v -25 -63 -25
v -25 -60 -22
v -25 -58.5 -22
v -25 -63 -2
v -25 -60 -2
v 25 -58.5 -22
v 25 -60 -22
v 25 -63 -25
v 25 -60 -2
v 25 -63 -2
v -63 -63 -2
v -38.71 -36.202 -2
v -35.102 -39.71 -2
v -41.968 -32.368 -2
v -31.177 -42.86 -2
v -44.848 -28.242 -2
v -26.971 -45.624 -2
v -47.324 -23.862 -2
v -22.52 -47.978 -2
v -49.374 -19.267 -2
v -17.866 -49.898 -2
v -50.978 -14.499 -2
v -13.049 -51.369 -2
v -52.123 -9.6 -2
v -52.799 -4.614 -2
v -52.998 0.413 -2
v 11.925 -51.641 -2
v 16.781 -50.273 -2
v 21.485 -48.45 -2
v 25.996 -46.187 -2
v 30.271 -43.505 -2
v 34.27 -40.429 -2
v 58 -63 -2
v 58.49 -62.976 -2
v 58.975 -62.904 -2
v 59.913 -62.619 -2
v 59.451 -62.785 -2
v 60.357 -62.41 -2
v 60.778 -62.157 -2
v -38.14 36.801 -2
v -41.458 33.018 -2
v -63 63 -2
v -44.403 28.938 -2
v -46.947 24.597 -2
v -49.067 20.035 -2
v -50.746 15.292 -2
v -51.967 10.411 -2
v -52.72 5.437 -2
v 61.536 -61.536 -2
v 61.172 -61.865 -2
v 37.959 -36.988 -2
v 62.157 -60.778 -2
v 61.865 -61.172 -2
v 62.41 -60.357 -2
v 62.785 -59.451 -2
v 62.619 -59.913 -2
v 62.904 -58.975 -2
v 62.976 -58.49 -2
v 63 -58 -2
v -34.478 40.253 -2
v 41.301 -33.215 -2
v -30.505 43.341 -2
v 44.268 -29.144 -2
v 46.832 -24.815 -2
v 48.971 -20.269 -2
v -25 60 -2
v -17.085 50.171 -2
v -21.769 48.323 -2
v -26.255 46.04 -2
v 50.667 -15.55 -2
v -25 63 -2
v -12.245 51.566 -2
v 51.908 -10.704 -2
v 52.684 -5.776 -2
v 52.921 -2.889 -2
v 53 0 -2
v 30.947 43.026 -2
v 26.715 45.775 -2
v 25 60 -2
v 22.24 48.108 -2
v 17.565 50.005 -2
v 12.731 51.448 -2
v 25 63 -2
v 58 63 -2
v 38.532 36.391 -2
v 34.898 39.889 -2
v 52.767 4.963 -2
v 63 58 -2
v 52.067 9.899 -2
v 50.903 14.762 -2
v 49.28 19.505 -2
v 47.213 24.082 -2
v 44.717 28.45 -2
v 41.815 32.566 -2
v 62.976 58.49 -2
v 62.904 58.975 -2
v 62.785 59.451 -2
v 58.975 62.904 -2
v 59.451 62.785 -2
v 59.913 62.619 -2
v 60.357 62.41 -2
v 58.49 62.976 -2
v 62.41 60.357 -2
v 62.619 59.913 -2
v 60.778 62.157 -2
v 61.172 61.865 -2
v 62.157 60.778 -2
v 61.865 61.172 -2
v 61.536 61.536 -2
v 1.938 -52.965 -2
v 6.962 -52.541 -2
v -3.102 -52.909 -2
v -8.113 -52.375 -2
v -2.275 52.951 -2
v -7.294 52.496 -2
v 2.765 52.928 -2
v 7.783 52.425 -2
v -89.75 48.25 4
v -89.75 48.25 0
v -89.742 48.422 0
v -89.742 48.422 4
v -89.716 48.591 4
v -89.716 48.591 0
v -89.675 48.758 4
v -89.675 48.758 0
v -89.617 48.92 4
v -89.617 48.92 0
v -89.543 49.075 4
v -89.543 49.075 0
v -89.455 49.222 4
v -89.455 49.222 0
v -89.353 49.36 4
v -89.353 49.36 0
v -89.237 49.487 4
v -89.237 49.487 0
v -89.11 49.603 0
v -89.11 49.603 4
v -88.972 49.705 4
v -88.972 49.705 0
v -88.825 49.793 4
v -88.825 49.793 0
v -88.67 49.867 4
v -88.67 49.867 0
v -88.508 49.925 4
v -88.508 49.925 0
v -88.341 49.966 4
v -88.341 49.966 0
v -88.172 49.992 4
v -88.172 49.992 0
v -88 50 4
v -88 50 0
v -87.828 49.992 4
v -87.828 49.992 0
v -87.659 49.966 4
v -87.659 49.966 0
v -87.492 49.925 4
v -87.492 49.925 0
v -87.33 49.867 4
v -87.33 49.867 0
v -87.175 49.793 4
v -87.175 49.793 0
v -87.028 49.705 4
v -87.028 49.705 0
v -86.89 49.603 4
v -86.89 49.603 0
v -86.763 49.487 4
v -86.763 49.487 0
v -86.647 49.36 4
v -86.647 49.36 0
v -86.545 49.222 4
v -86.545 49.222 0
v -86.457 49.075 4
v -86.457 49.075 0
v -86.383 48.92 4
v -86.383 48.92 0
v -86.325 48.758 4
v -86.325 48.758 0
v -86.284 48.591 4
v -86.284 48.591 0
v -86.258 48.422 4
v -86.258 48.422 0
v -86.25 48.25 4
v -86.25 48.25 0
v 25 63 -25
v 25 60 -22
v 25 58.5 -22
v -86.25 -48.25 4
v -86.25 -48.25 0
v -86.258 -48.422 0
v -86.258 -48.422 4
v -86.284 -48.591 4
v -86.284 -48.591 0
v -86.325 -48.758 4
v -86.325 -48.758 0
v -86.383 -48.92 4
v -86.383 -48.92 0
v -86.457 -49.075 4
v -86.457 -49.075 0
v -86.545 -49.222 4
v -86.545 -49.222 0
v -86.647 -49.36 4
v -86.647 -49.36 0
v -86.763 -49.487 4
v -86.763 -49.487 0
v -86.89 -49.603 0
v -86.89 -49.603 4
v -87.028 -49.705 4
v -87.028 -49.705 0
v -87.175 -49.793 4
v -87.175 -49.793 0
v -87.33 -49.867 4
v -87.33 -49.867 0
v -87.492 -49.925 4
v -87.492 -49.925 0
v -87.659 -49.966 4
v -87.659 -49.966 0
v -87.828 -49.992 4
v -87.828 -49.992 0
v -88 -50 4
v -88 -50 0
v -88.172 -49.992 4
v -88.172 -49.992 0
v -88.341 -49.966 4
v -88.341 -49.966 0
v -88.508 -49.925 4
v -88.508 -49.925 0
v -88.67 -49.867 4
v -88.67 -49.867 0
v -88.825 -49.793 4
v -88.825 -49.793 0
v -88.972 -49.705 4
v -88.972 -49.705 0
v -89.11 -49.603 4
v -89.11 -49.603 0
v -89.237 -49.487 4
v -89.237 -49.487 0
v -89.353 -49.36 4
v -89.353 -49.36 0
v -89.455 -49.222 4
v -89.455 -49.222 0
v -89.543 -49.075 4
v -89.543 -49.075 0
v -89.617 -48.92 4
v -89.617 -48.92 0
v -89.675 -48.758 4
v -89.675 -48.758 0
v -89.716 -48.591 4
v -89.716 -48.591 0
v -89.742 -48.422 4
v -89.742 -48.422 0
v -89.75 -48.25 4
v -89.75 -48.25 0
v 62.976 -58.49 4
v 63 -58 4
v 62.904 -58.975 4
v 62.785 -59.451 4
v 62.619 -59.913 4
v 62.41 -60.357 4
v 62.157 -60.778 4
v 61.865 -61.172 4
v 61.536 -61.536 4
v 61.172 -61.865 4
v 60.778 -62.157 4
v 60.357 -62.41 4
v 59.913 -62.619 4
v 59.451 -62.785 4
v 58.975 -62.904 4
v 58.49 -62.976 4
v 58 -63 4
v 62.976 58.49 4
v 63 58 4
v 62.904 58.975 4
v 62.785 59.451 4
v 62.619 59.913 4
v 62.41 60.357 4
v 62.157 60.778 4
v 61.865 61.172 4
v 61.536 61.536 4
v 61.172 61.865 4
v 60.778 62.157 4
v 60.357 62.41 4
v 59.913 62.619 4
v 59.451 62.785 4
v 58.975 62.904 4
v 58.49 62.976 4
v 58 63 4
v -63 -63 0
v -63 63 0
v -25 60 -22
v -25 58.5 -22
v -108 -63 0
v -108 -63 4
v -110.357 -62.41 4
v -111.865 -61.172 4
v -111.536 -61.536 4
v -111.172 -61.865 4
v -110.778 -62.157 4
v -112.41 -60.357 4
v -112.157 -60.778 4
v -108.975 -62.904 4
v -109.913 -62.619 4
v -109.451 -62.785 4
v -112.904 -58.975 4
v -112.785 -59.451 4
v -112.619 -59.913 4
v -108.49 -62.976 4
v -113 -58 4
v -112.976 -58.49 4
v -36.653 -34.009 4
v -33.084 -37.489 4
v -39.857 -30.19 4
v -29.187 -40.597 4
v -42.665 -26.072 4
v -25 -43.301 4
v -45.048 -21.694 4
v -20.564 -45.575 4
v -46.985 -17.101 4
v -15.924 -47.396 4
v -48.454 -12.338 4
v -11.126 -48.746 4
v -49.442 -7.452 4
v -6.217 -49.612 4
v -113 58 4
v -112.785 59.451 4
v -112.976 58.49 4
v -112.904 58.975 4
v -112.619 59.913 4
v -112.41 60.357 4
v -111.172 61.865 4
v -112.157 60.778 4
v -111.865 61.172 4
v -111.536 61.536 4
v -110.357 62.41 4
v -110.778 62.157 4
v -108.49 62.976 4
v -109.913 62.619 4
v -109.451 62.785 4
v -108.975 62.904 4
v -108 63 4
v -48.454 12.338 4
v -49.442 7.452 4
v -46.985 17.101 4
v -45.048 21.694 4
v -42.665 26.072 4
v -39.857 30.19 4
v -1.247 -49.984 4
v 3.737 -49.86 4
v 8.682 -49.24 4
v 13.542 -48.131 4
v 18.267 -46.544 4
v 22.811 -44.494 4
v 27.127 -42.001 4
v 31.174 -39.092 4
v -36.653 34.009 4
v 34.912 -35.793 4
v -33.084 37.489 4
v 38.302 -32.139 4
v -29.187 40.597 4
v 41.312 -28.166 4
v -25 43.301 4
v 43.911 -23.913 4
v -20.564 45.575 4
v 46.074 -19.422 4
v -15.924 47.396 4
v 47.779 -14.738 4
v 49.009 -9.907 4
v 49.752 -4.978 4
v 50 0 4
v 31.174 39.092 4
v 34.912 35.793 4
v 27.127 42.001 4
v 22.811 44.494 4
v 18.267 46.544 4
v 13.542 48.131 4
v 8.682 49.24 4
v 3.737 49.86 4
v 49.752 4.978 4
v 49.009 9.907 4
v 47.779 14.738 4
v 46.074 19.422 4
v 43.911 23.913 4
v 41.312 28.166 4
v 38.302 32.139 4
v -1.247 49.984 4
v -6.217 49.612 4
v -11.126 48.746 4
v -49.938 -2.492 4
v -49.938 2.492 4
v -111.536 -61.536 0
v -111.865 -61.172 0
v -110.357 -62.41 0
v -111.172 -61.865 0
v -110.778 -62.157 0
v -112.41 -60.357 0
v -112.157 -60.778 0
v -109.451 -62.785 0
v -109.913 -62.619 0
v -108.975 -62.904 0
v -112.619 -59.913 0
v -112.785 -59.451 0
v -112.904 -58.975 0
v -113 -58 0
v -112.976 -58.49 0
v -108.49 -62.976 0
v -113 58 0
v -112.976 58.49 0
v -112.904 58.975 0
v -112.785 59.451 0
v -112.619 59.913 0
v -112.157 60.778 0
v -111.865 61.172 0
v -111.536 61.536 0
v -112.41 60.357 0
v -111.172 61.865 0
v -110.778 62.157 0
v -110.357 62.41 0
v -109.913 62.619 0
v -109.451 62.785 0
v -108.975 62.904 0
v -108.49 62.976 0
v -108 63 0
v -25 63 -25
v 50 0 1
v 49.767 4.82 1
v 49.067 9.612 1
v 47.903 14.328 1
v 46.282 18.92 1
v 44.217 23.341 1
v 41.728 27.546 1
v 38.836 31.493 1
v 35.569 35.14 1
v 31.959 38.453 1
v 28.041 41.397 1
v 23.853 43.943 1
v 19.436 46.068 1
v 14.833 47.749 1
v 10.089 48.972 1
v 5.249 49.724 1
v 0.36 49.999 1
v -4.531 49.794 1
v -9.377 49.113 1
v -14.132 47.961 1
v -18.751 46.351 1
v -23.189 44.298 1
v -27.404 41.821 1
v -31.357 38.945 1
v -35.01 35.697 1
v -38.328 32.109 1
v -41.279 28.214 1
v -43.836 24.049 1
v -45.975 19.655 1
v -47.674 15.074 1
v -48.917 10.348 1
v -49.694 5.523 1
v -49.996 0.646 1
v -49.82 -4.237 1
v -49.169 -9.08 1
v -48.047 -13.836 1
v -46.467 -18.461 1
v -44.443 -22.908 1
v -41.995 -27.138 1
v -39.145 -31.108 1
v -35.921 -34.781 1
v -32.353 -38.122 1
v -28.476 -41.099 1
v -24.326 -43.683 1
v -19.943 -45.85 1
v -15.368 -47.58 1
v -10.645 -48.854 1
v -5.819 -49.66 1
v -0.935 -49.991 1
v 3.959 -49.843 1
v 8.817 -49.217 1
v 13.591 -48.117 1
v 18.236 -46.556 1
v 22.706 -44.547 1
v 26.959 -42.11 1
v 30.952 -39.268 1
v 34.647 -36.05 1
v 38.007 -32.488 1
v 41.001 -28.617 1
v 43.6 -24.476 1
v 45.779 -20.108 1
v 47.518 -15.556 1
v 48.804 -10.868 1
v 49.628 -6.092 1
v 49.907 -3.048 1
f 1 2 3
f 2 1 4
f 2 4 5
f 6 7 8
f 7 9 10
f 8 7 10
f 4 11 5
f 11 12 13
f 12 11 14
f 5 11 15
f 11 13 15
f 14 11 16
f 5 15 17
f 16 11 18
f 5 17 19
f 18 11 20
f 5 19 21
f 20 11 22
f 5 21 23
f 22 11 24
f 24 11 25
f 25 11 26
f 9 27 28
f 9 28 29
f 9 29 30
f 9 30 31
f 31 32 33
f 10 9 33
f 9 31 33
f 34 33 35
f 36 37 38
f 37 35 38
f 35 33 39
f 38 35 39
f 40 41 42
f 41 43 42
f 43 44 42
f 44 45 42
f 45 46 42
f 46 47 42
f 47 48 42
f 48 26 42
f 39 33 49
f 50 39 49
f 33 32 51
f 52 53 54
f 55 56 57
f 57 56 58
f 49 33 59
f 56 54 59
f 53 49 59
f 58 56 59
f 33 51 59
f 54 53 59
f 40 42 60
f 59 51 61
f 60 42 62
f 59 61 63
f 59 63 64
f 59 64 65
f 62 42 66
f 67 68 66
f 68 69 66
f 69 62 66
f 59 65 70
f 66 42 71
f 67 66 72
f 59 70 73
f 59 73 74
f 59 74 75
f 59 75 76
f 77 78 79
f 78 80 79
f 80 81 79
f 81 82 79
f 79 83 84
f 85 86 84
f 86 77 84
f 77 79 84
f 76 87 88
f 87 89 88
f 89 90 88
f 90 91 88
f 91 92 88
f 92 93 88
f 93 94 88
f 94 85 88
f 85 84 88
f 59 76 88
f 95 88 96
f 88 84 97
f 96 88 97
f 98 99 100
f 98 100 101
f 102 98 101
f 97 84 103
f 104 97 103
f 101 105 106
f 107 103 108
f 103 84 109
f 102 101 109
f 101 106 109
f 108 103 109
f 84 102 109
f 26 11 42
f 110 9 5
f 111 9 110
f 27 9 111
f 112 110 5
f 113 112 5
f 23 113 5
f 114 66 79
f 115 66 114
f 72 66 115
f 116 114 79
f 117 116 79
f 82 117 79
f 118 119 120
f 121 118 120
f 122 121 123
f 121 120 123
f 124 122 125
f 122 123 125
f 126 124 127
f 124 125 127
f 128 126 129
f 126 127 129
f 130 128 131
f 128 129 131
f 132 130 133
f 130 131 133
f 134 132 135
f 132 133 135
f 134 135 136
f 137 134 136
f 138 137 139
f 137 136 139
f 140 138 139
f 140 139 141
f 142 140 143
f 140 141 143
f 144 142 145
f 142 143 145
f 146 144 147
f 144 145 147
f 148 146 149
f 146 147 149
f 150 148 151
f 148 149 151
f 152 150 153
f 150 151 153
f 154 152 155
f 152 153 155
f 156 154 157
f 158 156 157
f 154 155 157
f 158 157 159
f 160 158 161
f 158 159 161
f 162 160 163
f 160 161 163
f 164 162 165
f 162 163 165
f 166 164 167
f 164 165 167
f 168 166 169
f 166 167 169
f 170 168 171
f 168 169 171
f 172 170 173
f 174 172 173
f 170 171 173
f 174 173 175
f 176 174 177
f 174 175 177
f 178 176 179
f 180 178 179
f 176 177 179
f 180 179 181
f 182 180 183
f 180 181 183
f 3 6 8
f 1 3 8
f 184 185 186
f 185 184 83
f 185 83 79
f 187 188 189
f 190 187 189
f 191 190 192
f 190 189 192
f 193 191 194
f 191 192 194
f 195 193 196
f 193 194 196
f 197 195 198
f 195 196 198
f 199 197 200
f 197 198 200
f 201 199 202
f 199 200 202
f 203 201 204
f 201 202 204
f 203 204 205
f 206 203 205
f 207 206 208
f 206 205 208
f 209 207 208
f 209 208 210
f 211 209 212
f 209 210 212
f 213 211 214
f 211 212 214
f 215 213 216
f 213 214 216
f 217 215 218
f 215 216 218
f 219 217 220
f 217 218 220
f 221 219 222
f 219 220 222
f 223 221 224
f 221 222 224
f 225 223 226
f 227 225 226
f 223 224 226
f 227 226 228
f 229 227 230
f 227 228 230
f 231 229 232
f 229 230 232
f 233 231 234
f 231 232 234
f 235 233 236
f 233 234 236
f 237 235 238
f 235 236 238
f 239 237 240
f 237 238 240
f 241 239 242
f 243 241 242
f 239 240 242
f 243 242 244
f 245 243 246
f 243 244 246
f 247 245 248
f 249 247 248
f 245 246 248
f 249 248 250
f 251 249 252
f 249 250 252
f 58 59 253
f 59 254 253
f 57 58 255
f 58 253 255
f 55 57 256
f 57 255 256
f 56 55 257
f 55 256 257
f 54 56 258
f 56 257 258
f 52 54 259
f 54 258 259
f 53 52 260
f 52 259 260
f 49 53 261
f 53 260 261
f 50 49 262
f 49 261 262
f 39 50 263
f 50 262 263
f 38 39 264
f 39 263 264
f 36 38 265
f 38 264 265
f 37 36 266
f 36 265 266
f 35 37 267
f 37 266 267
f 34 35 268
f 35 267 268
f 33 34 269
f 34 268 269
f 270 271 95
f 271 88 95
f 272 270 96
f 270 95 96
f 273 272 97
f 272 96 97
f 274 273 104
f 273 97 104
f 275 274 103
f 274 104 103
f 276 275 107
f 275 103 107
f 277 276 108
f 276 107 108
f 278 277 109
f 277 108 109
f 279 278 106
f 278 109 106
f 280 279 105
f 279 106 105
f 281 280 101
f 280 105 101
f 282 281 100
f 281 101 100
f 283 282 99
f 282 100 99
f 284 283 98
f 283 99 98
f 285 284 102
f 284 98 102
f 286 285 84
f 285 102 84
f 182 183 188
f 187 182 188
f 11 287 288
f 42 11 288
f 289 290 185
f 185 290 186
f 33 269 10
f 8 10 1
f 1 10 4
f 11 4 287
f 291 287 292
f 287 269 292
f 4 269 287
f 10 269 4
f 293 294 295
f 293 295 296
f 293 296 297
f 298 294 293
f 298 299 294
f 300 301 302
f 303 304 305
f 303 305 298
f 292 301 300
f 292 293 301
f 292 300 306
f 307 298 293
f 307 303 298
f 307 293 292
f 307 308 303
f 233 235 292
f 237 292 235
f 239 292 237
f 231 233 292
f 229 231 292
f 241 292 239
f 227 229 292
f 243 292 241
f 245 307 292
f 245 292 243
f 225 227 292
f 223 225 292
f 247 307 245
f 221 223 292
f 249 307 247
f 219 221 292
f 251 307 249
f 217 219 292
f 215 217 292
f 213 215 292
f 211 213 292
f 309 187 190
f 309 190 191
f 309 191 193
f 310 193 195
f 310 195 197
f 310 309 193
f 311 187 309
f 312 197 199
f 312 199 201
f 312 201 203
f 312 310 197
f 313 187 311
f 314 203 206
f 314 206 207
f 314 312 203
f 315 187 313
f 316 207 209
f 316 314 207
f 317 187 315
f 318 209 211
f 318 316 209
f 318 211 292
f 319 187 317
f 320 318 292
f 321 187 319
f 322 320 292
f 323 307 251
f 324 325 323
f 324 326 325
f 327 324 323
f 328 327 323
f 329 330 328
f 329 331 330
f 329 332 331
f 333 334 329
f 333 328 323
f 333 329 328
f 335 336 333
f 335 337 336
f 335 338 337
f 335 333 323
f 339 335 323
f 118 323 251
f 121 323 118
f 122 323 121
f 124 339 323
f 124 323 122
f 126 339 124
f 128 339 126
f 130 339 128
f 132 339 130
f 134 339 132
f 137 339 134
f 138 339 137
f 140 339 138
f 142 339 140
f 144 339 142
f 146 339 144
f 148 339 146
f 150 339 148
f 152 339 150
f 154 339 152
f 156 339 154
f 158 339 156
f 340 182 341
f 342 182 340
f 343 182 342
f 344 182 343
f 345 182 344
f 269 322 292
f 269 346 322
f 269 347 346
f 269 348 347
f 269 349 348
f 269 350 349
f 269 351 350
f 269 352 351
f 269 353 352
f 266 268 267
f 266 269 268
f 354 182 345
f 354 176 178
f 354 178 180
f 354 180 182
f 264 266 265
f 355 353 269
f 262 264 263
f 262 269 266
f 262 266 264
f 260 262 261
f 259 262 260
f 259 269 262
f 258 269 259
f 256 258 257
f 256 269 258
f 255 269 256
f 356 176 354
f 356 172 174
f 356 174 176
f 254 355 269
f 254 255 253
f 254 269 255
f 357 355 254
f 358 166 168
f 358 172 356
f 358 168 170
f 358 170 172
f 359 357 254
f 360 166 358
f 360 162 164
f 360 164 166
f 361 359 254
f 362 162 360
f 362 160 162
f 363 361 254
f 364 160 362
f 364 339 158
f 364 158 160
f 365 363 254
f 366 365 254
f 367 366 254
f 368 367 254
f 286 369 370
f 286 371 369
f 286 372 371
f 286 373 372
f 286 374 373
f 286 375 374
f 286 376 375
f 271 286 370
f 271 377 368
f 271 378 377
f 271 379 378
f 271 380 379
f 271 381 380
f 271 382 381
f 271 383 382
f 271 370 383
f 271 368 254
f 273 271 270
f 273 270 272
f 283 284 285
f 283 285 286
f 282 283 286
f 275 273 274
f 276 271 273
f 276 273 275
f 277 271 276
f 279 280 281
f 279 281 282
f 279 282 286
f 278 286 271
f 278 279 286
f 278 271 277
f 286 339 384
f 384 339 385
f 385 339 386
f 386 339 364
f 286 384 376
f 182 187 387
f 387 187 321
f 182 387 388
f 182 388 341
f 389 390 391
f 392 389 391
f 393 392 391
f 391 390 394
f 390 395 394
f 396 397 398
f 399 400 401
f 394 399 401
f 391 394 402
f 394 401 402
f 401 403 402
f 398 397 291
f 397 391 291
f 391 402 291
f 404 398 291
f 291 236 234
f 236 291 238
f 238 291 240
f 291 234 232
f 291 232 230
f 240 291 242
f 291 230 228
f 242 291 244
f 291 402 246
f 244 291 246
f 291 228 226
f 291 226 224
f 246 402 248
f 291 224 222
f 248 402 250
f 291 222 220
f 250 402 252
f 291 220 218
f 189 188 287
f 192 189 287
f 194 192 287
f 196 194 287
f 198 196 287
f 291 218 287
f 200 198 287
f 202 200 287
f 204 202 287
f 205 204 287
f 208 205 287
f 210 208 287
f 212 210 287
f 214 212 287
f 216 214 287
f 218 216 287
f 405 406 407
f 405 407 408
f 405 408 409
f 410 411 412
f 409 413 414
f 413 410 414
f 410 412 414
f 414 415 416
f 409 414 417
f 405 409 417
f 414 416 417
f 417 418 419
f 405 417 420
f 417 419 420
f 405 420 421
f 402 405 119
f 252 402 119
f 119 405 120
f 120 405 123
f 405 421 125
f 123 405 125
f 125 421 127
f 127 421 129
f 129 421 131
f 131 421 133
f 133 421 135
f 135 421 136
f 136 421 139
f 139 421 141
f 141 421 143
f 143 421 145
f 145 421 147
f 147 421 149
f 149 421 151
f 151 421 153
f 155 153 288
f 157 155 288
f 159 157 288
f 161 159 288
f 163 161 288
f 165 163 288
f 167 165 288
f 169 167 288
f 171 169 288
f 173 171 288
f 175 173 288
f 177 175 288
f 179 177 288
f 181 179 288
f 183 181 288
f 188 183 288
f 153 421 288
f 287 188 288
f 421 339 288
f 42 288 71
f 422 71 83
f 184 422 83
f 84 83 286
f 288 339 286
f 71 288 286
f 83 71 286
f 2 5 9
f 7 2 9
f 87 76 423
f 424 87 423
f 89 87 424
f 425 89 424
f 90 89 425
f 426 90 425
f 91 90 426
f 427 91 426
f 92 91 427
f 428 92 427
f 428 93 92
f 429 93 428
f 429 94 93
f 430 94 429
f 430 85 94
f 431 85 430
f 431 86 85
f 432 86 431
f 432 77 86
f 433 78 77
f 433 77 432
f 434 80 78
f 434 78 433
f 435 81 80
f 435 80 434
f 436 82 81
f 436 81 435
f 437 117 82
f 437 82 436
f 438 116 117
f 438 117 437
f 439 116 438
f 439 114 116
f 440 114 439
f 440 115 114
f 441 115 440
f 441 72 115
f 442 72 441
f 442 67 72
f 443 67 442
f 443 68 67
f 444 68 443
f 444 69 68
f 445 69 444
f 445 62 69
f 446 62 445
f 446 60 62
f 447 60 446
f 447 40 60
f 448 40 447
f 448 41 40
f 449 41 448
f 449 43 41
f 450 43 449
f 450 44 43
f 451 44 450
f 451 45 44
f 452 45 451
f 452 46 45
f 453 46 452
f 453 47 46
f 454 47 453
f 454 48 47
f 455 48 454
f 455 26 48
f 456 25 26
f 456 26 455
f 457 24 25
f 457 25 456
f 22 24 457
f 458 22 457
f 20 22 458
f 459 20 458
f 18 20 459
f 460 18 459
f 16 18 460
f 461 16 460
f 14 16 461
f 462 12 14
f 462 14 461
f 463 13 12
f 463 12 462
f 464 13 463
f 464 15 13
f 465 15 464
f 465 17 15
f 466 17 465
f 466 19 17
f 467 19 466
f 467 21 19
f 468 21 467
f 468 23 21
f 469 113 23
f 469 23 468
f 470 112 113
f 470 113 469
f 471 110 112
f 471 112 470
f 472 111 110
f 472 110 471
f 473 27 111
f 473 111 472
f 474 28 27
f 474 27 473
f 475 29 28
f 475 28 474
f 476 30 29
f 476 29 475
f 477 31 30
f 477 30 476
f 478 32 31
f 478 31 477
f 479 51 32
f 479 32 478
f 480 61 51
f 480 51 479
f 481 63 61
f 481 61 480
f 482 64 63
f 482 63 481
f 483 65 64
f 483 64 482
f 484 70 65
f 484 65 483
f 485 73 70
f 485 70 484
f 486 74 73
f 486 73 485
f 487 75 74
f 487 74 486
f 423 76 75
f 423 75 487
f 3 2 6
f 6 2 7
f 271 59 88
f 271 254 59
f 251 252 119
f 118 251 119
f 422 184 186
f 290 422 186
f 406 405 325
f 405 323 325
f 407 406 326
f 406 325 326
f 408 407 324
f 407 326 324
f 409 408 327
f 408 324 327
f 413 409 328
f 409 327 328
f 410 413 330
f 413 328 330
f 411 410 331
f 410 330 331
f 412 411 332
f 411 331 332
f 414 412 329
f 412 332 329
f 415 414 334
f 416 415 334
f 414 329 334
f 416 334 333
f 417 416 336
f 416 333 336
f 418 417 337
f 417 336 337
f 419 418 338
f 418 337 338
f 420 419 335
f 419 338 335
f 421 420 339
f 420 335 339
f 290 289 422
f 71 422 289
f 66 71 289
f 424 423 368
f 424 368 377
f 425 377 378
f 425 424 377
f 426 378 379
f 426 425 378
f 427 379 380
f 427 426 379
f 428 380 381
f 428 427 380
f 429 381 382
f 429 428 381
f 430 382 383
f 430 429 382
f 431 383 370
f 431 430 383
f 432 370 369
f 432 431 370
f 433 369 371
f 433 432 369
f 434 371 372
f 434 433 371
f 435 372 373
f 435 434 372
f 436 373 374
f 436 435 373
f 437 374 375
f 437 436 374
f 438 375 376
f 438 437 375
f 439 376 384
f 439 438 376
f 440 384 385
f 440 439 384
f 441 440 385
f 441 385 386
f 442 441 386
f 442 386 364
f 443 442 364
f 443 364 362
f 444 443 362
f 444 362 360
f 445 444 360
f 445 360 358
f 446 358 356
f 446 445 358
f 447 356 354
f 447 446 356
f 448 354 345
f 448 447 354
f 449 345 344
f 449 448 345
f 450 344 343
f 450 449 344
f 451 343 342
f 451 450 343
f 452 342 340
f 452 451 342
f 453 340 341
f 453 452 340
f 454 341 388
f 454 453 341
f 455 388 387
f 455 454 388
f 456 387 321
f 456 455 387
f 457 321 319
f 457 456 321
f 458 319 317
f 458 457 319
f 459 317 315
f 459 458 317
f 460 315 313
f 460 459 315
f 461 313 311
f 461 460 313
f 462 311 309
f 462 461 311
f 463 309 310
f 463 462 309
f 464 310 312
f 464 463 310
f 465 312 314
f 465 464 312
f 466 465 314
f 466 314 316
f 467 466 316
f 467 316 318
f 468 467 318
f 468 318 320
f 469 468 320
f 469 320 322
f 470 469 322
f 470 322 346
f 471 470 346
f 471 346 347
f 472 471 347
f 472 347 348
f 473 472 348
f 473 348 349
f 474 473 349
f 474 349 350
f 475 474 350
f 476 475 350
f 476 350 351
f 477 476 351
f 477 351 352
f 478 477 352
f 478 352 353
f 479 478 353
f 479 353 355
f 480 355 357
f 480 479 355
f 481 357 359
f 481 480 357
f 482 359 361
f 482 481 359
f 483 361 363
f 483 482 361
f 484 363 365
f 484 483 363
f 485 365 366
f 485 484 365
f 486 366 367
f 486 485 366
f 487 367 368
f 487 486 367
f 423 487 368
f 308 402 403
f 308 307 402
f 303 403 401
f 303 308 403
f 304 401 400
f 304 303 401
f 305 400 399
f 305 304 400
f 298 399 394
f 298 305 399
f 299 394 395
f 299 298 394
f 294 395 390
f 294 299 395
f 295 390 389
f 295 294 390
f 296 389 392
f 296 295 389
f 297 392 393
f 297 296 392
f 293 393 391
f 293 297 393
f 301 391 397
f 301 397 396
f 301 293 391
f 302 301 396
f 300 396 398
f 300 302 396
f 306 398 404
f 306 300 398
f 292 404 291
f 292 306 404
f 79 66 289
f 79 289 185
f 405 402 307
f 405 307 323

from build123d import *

# Parameters (mm, degrees)
F0_W     = 126
F0_H     = 126
F0_W_2   = 120
F0_H_2   = 120
F0_R     = 50
F0_W_3   = 50
F1_DEPTH = 4
F2_DEPTH = 2
F3_R     = 5
F4_W     = 50
F4_H     = 3
F5_DEPTH = 20
F6_W     = 50
F6_H     = 1.5
F6_H_2   = 3
F7_DEPTH = 3
F9_DEPTH = 50
F10_SIZE = 3


with BuildPart() as f1:
    # F0 (on Top) → F1 (new body)
    with BuildSketch(Plane.XY):
        Rectangle(F0_W, F0_H)
        Rectangle(F0_W_2, F0_H_2, mode=Mode.SUBTRACT)
        Rectangle(F0_W_2, F0_H_2)
        Circle(F0_R, mode=Mode.SUBTRACT)
        with Locations((-88, 0)):
            Rectangle(F0_W_3, F0_H)
        with BuildLine():
            Line((-86.25, 48.25), (-86.25, -48.25))
            ThreePointArc((-86.25, -48.25), (-88, -50), (-89.75, -48.25))
            Line((-89.75, -48.25), (-89.75, 48.25))
            ThreePointArc((-89.75, 48.25), (-88, 50), (-86.25, 48.25))
        make_face(mode=Mode.SUBTRACT)
    extrude(amount=F1_DEPTH)

    # F0 (on Top) → F2 (join)
    with BuildSketch(Plane.XY):
        Rectangle(F0_W, F0_H)
        Rectangle(F0_W_2, F0_H_2, mode=Mode.SUBTRACT)
        Rectangle(F0_W_2, F0_H_2)
        Circle(F0_R, mode=Mode.SUBTRACT)
    extrude(amount=-F2_DEPTH)

    # F3
    f3_edges = [f1.edges().sort_by_distance(p)[0] for p in [
        (-113, 63, 2),
        (-113, -63, 2),
        (63, 63, 1),
        (63, -63, 1),
    ]]
    fillet(f3_edges, radius=F3_R)

    # F4 (on face) → F5 (join)
    with BuildSketch(Plane(origin=(0, 0, -2), x_dir=(1, 0, 0), z_dir=(0, 0, -1))):
        with Locations((0, 61.5)):
            Rectangle(F4_W, F4_H)
        with Locations((0, -61.5)):
            Rectangle(F4_W, F4_H)
    extrude(amount=F5_DEPTH)

    # F6 (on face) → F7 (join)
    with BuildSketch(Plane(origin=(0, 0, -22), x_dir=(1, 0, 0), z_dir=(0, 0, -1))):
        Polygon((-25, 60), (-25, 58.5), (25, 58.5), (25, 60), (25, 63), (-25, 63), align=None)
        with Locations((0, -59.25)):
            Rectangle(F6_W, F6_H)
        with Locations((0, -61.5)):
            Rectangle(F6_W, F6_H_2)
    extrude(amount=F7_DEPTH)

    # F8 (on face) → F9 (cut, through all)
    with BuildSketch(Plane.YZ.offset(25)):
        Polygon((-58.5, -25), (-58.5, -22), (-63, -25), align=None)
        Polygon((63, -25), (58.5, -22), (58.5, -25), align=None)
    extrude(amount=-F9_DEPTH, mode=Mode.SUBTRACT)

    # F10
    f10_edges = [f1.edges().sort_by_distance(p)[0] for p in [
        (-50, 0, -2),
    ]]
    chamfer(f10_edges, length=F10_SIZE)


solid = f1.part
